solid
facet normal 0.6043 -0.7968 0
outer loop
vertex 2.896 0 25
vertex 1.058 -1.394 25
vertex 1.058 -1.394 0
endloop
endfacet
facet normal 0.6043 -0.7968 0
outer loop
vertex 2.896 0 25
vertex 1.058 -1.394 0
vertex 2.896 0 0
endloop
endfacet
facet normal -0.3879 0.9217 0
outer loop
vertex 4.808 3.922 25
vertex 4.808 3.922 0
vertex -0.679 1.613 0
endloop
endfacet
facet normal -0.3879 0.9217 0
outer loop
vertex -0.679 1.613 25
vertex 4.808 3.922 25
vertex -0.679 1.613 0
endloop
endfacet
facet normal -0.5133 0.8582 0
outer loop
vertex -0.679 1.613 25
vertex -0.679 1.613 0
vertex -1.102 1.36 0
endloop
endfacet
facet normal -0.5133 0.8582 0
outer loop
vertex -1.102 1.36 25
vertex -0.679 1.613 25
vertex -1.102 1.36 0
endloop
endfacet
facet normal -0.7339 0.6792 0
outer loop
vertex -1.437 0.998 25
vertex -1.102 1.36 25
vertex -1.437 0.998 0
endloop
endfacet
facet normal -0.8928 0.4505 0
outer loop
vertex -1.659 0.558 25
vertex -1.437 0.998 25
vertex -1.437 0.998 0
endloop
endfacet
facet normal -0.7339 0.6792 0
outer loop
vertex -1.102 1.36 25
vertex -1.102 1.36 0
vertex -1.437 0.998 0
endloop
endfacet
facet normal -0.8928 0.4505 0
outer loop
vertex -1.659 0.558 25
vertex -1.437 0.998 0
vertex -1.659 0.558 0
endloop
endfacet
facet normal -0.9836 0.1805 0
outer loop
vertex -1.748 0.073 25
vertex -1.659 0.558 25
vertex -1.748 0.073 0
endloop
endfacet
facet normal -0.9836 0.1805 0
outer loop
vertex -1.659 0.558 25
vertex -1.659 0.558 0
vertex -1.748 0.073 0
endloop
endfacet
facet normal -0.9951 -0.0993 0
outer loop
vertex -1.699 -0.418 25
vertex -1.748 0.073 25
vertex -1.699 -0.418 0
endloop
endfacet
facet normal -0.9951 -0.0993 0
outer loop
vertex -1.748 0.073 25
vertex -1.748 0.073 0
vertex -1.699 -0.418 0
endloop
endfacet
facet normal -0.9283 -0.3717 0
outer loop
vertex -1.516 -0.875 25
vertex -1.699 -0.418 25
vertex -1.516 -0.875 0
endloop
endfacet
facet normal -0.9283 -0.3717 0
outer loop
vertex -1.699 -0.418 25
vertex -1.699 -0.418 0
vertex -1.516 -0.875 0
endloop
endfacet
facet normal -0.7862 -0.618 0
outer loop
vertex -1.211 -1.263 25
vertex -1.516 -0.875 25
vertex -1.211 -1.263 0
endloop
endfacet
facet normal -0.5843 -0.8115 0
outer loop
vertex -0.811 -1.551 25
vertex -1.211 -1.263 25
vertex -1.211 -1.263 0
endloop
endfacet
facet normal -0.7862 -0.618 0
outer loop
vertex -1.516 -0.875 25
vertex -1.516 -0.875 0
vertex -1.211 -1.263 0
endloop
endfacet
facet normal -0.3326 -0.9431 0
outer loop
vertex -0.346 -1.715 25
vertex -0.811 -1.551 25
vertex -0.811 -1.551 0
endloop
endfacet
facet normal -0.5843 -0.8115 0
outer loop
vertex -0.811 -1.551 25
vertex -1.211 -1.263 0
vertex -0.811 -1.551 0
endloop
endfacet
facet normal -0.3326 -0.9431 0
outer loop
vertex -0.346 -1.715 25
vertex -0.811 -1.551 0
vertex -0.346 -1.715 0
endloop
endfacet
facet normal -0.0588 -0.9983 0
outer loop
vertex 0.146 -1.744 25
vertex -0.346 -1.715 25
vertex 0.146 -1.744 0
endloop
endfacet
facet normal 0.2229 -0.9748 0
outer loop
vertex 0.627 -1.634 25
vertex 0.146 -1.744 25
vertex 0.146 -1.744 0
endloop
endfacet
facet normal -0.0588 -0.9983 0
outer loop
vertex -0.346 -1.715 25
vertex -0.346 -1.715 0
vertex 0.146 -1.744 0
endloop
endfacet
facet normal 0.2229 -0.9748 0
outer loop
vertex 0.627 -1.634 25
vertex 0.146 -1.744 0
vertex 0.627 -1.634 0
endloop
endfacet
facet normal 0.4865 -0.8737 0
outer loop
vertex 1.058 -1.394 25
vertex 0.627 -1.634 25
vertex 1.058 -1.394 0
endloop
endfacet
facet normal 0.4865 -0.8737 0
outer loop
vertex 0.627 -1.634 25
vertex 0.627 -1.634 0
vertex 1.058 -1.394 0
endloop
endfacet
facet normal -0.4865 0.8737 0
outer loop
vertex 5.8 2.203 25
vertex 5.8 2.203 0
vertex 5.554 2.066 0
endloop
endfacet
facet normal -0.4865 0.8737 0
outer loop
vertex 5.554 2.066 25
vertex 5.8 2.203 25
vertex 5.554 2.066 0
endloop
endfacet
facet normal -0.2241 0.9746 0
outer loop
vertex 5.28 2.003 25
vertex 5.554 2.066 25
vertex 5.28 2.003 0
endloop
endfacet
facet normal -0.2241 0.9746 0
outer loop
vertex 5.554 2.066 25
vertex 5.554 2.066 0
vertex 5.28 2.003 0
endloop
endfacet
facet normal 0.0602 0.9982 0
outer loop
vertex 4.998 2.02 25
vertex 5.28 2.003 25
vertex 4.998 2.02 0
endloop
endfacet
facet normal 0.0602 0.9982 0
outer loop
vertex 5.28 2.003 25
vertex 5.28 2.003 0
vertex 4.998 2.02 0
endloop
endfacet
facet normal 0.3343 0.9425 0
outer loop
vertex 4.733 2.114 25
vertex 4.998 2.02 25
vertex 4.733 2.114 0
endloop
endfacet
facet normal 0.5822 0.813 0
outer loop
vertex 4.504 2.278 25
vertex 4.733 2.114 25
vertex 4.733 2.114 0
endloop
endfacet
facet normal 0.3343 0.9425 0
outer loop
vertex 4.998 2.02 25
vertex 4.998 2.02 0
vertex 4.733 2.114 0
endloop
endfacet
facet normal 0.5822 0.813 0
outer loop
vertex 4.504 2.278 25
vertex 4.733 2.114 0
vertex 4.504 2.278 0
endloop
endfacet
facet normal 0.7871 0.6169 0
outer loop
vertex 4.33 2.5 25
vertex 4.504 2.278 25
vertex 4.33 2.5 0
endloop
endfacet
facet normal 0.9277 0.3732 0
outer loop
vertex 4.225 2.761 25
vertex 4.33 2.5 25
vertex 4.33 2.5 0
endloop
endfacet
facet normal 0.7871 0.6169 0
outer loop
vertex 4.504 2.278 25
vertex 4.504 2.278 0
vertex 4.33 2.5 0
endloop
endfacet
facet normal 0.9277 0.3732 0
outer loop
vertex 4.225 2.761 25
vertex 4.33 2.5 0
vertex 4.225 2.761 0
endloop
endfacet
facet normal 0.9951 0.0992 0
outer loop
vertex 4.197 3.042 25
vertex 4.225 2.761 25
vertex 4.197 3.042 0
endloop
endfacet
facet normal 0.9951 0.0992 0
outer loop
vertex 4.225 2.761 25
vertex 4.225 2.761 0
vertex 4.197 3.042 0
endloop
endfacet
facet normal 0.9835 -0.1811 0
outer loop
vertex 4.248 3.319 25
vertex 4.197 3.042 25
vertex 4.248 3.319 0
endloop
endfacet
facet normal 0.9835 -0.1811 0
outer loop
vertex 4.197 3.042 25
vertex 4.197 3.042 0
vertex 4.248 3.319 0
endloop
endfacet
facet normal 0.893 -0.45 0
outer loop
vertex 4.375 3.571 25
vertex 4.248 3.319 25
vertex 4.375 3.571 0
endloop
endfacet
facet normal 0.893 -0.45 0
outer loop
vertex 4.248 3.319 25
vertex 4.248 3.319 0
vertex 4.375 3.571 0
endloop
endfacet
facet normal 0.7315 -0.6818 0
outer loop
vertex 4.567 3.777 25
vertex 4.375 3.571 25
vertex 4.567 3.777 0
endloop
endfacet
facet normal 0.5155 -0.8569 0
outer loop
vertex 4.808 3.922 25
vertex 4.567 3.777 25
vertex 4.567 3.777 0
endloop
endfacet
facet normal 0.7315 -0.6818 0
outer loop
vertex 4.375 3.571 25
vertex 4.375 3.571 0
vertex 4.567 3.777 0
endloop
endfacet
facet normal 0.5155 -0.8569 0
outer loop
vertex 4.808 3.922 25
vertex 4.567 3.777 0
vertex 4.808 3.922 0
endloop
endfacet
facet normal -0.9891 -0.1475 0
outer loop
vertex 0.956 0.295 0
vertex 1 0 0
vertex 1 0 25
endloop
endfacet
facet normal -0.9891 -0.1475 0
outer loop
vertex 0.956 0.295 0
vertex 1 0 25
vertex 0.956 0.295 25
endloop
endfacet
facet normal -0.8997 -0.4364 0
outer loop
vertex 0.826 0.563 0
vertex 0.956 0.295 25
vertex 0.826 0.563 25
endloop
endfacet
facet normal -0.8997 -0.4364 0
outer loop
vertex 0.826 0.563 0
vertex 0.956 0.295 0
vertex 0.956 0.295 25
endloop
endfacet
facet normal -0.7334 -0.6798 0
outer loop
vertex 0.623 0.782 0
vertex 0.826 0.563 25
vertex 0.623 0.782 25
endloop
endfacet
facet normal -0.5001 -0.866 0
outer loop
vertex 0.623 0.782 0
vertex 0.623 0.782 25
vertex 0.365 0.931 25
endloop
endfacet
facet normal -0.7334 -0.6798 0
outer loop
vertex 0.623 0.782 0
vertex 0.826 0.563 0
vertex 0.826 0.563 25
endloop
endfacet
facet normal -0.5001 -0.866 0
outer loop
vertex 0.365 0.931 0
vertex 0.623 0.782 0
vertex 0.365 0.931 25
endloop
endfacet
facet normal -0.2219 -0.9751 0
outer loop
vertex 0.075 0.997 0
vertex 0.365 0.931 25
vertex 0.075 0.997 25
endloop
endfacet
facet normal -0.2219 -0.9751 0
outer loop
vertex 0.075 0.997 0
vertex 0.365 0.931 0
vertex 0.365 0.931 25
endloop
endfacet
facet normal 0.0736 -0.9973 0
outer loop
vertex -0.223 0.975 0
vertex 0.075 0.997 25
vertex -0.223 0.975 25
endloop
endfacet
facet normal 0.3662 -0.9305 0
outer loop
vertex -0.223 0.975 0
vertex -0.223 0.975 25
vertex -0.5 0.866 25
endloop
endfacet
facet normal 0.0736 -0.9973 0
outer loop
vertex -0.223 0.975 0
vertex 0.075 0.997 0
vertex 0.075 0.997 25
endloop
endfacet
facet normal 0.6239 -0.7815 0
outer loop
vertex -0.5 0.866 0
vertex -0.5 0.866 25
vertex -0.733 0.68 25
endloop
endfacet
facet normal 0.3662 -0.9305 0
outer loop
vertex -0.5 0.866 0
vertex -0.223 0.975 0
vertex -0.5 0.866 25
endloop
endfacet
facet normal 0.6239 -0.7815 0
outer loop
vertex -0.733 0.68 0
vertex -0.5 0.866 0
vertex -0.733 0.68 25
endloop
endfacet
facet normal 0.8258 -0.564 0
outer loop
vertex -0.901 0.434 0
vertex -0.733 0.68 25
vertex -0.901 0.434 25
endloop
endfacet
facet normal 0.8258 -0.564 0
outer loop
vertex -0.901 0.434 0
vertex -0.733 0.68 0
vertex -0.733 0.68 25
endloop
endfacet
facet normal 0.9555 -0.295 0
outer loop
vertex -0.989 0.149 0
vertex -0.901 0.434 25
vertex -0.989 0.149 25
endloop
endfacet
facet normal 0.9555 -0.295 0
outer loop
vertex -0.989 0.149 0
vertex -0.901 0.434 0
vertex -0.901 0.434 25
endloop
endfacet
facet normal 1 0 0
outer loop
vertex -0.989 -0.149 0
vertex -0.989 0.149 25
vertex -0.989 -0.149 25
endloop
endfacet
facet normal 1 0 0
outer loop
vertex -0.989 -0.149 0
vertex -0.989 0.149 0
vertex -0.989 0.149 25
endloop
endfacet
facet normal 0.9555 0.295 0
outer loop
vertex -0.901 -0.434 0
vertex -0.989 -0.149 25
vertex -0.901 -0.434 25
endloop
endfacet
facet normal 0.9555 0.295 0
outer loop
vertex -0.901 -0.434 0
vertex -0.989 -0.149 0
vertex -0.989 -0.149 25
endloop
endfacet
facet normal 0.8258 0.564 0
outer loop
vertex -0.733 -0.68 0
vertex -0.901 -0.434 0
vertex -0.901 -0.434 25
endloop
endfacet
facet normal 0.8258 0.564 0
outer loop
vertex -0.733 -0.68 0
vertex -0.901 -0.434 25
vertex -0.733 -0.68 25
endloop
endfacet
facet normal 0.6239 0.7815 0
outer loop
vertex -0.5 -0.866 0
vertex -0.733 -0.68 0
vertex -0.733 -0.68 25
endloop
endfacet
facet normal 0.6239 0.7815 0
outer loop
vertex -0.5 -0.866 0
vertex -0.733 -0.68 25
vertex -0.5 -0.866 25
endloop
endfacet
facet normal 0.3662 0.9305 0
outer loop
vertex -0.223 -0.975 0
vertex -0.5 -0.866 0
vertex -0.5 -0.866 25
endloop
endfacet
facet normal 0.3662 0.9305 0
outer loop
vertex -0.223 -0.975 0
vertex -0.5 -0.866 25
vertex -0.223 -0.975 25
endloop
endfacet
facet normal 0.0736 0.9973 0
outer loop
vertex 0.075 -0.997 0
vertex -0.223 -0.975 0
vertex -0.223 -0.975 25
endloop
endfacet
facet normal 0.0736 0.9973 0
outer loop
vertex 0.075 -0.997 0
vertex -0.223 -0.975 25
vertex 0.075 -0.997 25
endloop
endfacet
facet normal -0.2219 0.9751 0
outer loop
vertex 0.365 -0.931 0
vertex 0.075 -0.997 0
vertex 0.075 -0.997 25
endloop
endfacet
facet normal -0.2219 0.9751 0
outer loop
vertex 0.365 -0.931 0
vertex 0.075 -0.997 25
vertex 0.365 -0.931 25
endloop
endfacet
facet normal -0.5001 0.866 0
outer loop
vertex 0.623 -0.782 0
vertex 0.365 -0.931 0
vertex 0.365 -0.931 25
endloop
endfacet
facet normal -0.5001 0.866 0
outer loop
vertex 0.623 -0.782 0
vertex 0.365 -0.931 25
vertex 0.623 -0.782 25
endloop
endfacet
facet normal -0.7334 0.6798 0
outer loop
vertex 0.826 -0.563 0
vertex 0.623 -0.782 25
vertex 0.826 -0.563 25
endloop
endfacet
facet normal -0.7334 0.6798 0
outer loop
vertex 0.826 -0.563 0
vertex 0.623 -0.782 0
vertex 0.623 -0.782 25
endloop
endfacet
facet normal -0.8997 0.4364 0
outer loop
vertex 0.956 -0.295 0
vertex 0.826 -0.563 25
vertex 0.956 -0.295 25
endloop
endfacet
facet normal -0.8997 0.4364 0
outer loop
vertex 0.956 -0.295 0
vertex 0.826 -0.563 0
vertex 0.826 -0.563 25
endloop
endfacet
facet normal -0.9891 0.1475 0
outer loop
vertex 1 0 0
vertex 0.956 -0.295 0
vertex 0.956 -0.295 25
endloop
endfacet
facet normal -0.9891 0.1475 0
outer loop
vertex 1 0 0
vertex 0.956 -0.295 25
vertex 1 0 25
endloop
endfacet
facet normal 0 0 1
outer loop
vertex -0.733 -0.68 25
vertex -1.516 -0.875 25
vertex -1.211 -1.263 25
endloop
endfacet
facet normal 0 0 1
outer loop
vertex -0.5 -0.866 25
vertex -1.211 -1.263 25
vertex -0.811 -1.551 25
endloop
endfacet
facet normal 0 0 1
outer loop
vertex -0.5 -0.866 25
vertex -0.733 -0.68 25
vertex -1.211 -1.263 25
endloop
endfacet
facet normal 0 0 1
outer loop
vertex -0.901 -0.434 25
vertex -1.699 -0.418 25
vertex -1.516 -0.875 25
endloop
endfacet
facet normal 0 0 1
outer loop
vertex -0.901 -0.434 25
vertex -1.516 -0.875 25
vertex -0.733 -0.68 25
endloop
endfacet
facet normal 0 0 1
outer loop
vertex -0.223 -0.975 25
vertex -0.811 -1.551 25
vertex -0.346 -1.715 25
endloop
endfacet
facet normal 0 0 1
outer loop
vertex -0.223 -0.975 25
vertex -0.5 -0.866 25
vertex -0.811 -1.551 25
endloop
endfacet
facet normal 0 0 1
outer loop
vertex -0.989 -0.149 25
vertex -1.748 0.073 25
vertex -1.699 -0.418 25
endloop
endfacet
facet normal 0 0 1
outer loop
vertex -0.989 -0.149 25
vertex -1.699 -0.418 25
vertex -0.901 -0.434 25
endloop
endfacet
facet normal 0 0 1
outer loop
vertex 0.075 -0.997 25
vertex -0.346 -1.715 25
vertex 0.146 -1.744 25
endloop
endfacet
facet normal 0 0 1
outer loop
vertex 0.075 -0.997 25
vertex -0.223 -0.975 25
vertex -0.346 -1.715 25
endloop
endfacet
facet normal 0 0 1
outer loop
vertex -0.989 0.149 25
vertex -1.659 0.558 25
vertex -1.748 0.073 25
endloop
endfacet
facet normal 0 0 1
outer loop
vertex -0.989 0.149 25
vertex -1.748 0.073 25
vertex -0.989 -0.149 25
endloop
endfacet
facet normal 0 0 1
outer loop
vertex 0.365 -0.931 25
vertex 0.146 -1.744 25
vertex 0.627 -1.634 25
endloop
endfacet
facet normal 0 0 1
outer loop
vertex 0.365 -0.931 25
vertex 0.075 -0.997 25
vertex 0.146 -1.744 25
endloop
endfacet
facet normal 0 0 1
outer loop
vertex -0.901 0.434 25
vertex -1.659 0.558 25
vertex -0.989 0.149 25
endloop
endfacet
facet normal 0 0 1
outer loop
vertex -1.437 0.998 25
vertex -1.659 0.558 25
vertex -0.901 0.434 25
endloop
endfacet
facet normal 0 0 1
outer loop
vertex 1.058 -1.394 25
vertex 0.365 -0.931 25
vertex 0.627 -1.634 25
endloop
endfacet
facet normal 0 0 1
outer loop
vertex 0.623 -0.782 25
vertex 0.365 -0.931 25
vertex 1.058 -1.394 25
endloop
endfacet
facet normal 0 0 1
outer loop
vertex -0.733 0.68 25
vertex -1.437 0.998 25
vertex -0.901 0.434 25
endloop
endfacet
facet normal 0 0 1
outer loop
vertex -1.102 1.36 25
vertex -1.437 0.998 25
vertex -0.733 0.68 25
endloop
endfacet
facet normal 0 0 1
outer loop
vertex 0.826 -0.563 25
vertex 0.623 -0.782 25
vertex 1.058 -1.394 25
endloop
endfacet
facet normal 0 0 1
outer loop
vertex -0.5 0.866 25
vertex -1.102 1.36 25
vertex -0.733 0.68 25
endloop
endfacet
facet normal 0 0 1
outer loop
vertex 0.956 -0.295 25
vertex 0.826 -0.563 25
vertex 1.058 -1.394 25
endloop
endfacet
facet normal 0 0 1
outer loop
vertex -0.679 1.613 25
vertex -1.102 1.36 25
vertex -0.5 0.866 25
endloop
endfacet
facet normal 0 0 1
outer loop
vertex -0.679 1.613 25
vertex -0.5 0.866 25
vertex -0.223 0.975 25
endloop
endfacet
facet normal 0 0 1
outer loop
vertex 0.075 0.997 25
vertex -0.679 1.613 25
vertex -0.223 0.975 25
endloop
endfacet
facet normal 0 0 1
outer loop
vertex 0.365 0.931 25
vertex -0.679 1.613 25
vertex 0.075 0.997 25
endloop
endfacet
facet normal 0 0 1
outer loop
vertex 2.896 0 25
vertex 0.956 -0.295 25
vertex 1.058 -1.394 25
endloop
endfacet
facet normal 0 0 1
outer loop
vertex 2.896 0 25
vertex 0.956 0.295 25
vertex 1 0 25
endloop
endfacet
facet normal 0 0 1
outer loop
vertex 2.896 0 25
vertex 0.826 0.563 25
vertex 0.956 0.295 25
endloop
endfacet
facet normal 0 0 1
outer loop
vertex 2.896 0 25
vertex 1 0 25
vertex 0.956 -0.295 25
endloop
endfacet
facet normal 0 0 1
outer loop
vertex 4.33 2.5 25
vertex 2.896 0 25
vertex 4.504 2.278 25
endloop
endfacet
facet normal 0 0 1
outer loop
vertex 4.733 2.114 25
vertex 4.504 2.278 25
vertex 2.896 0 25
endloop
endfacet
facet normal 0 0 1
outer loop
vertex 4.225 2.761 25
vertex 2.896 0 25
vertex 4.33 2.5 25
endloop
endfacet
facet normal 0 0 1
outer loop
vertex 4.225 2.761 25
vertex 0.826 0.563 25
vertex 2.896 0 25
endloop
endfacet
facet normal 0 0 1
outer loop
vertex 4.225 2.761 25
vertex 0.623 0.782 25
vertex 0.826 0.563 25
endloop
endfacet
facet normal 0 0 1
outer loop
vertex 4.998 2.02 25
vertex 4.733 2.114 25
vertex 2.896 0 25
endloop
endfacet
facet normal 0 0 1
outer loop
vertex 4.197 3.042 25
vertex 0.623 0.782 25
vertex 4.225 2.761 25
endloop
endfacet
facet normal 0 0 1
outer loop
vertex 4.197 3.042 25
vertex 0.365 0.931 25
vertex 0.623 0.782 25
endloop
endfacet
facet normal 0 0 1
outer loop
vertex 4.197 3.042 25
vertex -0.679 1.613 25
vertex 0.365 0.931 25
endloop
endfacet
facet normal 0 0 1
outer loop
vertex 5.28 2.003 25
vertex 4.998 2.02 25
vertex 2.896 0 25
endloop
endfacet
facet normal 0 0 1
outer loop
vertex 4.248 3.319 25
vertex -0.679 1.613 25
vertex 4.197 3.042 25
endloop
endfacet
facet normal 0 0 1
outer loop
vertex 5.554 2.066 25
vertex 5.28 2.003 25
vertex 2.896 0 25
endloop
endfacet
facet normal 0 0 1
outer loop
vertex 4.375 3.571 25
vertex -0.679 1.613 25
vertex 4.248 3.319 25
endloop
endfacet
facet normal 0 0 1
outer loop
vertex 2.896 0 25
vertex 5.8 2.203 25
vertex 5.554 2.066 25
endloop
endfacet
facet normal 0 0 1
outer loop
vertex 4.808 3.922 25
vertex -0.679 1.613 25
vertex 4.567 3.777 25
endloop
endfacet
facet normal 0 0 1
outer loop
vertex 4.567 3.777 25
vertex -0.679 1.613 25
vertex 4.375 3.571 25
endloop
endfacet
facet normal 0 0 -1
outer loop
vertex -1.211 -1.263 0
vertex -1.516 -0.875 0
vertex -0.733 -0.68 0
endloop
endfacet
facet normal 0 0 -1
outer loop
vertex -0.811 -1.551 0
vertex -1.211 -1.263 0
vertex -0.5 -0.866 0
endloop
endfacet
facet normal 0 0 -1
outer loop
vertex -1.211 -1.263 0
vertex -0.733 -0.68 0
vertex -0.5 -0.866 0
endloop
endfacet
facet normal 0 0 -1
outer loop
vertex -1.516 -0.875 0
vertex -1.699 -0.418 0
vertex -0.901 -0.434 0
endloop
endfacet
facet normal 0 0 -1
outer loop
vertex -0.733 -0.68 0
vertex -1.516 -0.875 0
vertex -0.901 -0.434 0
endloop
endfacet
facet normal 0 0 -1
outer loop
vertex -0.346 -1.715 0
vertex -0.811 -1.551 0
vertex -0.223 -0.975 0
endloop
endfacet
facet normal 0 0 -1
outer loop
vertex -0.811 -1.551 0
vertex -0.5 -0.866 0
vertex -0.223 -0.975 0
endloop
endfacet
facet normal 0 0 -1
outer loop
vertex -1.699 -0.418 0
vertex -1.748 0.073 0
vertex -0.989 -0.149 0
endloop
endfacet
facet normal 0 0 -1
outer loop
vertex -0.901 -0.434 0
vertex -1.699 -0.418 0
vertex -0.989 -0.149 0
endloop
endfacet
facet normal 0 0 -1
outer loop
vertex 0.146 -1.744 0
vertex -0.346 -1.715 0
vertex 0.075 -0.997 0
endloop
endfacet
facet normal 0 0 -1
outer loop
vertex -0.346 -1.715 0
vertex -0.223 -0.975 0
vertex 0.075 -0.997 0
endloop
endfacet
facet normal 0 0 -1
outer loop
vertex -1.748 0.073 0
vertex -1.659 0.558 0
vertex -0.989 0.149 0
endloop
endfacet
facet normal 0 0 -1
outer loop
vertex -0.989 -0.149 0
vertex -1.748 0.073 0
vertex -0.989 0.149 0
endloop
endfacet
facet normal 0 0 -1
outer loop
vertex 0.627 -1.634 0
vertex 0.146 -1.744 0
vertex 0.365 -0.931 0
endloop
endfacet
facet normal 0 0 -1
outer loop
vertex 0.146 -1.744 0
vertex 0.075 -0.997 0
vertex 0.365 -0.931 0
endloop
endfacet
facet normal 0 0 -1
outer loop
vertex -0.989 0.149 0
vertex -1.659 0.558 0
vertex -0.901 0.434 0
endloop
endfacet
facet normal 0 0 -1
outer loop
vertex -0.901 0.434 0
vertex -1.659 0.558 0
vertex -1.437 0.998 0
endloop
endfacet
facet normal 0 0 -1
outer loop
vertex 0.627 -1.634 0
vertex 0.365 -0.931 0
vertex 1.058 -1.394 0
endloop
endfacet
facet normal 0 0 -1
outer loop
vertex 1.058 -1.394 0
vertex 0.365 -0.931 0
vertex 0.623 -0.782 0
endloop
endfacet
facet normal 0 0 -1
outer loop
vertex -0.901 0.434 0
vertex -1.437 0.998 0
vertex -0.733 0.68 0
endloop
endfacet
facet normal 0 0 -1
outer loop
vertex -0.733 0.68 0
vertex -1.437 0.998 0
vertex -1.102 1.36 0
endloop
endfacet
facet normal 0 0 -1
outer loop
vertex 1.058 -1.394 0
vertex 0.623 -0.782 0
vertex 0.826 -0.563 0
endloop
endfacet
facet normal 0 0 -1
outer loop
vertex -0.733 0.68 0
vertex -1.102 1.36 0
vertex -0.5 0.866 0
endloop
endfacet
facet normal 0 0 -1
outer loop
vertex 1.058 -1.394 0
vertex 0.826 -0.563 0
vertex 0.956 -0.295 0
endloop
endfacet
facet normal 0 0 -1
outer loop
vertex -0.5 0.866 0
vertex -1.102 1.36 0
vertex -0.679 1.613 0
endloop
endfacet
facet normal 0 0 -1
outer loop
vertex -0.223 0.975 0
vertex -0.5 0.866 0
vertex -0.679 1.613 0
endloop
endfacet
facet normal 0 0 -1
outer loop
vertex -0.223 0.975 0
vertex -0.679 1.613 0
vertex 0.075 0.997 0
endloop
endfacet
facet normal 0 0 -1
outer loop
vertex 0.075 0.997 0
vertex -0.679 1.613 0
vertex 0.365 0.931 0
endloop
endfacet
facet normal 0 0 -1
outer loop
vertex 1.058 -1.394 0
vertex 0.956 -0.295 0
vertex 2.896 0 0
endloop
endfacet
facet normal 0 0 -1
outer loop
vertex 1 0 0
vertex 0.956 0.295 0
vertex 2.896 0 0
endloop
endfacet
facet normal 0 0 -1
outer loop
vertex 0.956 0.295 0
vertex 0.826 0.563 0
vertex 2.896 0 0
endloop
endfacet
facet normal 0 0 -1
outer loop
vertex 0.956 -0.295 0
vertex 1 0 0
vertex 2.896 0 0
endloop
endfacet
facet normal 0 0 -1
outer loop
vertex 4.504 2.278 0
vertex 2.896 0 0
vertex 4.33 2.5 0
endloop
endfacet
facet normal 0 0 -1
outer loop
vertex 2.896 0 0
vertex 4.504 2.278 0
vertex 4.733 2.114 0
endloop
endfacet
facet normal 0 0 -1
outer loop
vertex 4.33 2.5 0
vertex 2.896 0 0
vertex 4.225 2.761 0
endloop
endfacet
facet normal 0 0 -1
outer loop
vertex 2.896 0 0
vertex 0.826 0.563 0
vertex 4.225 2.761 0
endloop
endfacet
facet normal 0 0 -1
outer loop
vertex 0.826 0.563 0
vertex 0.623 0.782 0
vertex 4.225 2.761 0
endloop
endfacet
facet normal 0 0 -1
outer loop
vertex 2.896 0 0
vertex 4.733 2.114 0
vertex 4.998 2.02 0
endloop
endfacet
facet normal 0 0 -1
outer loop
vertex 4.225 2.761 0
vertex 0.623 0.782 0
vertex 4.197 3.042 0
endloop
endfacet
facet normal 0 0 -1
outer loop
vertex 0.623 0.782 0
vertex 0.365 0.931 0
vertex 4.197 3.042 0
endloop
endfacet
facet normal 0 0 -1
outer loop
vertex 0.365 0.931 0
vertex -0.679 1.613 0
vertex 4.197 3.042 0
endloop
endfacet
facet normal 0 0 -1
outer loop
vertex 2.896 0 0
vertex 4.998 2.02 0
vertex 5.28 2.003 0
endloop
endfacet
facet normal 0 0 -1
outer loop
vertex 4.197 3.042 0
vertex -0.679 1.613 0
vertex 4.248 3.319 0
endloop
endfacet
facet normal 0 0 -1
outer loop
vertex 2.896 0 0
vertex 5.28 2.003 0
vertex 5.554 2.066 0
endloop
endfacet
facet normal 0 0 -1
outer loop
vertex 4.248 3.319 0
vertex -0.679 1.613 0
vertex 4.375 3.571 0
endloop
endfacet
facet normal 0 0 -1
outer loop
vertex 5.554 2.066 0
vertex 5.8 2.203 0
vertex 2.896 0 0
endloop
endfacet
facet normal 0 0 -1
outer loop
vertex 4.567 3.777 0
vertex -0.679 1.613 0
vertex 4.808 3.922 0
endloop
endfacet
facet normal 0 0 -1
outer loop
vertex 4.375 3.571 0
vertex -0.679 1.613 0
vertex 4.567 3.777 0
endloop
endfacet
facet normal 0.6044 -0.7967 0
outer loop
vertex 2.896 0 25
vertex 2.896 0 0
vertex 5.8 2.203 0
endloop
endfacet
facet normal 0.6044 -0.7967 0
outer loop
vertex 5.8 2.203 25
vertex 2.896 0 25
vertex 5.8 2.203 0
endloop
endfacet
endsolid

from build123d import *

# Parameters (mm, degrees)
F0_R     = 1
F1_DEPTH = 25


with BuildPart() as f1:
    # F0 (on Top) → F1 (new body)
    with BuildSketch(Plane.XY):
        with BuildLine():
            ThreePointArc((1.05758, -1.394283), (1.567365, -0.778375), (1.75, 0))
            ThreePointArc((1.75, 0), (0.96819, 1.457775), (-0.678694, 1.613033))
            ThreePointArc((-0.678694, 1.613033), (-1.515544, -0.875), (1.05758, -1.394283))
        make_face()
        Circle(F0_R, mode=Mode.SUBTRACT)
        with BuildLine():
            ThreePointArc((-0.678694, 1.613033), (0.96819, 1.457775), (1.75, 0))
            ThreePointArc((1.75, 0), (1.567365, -0.778375), (1.05758, -1.394283))
            Line((1.05758, -1.394283), (2.895761, 0))
            Line((2.895761, 0), (5.800484, 2.203267))
            ThreePointArc((5.800484, 2.203267), (4.330127, 2.5), (4.808327, 3.921733))
            Line((4.808327, 3.921733), (-0.678694, 1.613033))
        make_face()
    extrude(amount=F1_DEPTH)


solid = f1.part
